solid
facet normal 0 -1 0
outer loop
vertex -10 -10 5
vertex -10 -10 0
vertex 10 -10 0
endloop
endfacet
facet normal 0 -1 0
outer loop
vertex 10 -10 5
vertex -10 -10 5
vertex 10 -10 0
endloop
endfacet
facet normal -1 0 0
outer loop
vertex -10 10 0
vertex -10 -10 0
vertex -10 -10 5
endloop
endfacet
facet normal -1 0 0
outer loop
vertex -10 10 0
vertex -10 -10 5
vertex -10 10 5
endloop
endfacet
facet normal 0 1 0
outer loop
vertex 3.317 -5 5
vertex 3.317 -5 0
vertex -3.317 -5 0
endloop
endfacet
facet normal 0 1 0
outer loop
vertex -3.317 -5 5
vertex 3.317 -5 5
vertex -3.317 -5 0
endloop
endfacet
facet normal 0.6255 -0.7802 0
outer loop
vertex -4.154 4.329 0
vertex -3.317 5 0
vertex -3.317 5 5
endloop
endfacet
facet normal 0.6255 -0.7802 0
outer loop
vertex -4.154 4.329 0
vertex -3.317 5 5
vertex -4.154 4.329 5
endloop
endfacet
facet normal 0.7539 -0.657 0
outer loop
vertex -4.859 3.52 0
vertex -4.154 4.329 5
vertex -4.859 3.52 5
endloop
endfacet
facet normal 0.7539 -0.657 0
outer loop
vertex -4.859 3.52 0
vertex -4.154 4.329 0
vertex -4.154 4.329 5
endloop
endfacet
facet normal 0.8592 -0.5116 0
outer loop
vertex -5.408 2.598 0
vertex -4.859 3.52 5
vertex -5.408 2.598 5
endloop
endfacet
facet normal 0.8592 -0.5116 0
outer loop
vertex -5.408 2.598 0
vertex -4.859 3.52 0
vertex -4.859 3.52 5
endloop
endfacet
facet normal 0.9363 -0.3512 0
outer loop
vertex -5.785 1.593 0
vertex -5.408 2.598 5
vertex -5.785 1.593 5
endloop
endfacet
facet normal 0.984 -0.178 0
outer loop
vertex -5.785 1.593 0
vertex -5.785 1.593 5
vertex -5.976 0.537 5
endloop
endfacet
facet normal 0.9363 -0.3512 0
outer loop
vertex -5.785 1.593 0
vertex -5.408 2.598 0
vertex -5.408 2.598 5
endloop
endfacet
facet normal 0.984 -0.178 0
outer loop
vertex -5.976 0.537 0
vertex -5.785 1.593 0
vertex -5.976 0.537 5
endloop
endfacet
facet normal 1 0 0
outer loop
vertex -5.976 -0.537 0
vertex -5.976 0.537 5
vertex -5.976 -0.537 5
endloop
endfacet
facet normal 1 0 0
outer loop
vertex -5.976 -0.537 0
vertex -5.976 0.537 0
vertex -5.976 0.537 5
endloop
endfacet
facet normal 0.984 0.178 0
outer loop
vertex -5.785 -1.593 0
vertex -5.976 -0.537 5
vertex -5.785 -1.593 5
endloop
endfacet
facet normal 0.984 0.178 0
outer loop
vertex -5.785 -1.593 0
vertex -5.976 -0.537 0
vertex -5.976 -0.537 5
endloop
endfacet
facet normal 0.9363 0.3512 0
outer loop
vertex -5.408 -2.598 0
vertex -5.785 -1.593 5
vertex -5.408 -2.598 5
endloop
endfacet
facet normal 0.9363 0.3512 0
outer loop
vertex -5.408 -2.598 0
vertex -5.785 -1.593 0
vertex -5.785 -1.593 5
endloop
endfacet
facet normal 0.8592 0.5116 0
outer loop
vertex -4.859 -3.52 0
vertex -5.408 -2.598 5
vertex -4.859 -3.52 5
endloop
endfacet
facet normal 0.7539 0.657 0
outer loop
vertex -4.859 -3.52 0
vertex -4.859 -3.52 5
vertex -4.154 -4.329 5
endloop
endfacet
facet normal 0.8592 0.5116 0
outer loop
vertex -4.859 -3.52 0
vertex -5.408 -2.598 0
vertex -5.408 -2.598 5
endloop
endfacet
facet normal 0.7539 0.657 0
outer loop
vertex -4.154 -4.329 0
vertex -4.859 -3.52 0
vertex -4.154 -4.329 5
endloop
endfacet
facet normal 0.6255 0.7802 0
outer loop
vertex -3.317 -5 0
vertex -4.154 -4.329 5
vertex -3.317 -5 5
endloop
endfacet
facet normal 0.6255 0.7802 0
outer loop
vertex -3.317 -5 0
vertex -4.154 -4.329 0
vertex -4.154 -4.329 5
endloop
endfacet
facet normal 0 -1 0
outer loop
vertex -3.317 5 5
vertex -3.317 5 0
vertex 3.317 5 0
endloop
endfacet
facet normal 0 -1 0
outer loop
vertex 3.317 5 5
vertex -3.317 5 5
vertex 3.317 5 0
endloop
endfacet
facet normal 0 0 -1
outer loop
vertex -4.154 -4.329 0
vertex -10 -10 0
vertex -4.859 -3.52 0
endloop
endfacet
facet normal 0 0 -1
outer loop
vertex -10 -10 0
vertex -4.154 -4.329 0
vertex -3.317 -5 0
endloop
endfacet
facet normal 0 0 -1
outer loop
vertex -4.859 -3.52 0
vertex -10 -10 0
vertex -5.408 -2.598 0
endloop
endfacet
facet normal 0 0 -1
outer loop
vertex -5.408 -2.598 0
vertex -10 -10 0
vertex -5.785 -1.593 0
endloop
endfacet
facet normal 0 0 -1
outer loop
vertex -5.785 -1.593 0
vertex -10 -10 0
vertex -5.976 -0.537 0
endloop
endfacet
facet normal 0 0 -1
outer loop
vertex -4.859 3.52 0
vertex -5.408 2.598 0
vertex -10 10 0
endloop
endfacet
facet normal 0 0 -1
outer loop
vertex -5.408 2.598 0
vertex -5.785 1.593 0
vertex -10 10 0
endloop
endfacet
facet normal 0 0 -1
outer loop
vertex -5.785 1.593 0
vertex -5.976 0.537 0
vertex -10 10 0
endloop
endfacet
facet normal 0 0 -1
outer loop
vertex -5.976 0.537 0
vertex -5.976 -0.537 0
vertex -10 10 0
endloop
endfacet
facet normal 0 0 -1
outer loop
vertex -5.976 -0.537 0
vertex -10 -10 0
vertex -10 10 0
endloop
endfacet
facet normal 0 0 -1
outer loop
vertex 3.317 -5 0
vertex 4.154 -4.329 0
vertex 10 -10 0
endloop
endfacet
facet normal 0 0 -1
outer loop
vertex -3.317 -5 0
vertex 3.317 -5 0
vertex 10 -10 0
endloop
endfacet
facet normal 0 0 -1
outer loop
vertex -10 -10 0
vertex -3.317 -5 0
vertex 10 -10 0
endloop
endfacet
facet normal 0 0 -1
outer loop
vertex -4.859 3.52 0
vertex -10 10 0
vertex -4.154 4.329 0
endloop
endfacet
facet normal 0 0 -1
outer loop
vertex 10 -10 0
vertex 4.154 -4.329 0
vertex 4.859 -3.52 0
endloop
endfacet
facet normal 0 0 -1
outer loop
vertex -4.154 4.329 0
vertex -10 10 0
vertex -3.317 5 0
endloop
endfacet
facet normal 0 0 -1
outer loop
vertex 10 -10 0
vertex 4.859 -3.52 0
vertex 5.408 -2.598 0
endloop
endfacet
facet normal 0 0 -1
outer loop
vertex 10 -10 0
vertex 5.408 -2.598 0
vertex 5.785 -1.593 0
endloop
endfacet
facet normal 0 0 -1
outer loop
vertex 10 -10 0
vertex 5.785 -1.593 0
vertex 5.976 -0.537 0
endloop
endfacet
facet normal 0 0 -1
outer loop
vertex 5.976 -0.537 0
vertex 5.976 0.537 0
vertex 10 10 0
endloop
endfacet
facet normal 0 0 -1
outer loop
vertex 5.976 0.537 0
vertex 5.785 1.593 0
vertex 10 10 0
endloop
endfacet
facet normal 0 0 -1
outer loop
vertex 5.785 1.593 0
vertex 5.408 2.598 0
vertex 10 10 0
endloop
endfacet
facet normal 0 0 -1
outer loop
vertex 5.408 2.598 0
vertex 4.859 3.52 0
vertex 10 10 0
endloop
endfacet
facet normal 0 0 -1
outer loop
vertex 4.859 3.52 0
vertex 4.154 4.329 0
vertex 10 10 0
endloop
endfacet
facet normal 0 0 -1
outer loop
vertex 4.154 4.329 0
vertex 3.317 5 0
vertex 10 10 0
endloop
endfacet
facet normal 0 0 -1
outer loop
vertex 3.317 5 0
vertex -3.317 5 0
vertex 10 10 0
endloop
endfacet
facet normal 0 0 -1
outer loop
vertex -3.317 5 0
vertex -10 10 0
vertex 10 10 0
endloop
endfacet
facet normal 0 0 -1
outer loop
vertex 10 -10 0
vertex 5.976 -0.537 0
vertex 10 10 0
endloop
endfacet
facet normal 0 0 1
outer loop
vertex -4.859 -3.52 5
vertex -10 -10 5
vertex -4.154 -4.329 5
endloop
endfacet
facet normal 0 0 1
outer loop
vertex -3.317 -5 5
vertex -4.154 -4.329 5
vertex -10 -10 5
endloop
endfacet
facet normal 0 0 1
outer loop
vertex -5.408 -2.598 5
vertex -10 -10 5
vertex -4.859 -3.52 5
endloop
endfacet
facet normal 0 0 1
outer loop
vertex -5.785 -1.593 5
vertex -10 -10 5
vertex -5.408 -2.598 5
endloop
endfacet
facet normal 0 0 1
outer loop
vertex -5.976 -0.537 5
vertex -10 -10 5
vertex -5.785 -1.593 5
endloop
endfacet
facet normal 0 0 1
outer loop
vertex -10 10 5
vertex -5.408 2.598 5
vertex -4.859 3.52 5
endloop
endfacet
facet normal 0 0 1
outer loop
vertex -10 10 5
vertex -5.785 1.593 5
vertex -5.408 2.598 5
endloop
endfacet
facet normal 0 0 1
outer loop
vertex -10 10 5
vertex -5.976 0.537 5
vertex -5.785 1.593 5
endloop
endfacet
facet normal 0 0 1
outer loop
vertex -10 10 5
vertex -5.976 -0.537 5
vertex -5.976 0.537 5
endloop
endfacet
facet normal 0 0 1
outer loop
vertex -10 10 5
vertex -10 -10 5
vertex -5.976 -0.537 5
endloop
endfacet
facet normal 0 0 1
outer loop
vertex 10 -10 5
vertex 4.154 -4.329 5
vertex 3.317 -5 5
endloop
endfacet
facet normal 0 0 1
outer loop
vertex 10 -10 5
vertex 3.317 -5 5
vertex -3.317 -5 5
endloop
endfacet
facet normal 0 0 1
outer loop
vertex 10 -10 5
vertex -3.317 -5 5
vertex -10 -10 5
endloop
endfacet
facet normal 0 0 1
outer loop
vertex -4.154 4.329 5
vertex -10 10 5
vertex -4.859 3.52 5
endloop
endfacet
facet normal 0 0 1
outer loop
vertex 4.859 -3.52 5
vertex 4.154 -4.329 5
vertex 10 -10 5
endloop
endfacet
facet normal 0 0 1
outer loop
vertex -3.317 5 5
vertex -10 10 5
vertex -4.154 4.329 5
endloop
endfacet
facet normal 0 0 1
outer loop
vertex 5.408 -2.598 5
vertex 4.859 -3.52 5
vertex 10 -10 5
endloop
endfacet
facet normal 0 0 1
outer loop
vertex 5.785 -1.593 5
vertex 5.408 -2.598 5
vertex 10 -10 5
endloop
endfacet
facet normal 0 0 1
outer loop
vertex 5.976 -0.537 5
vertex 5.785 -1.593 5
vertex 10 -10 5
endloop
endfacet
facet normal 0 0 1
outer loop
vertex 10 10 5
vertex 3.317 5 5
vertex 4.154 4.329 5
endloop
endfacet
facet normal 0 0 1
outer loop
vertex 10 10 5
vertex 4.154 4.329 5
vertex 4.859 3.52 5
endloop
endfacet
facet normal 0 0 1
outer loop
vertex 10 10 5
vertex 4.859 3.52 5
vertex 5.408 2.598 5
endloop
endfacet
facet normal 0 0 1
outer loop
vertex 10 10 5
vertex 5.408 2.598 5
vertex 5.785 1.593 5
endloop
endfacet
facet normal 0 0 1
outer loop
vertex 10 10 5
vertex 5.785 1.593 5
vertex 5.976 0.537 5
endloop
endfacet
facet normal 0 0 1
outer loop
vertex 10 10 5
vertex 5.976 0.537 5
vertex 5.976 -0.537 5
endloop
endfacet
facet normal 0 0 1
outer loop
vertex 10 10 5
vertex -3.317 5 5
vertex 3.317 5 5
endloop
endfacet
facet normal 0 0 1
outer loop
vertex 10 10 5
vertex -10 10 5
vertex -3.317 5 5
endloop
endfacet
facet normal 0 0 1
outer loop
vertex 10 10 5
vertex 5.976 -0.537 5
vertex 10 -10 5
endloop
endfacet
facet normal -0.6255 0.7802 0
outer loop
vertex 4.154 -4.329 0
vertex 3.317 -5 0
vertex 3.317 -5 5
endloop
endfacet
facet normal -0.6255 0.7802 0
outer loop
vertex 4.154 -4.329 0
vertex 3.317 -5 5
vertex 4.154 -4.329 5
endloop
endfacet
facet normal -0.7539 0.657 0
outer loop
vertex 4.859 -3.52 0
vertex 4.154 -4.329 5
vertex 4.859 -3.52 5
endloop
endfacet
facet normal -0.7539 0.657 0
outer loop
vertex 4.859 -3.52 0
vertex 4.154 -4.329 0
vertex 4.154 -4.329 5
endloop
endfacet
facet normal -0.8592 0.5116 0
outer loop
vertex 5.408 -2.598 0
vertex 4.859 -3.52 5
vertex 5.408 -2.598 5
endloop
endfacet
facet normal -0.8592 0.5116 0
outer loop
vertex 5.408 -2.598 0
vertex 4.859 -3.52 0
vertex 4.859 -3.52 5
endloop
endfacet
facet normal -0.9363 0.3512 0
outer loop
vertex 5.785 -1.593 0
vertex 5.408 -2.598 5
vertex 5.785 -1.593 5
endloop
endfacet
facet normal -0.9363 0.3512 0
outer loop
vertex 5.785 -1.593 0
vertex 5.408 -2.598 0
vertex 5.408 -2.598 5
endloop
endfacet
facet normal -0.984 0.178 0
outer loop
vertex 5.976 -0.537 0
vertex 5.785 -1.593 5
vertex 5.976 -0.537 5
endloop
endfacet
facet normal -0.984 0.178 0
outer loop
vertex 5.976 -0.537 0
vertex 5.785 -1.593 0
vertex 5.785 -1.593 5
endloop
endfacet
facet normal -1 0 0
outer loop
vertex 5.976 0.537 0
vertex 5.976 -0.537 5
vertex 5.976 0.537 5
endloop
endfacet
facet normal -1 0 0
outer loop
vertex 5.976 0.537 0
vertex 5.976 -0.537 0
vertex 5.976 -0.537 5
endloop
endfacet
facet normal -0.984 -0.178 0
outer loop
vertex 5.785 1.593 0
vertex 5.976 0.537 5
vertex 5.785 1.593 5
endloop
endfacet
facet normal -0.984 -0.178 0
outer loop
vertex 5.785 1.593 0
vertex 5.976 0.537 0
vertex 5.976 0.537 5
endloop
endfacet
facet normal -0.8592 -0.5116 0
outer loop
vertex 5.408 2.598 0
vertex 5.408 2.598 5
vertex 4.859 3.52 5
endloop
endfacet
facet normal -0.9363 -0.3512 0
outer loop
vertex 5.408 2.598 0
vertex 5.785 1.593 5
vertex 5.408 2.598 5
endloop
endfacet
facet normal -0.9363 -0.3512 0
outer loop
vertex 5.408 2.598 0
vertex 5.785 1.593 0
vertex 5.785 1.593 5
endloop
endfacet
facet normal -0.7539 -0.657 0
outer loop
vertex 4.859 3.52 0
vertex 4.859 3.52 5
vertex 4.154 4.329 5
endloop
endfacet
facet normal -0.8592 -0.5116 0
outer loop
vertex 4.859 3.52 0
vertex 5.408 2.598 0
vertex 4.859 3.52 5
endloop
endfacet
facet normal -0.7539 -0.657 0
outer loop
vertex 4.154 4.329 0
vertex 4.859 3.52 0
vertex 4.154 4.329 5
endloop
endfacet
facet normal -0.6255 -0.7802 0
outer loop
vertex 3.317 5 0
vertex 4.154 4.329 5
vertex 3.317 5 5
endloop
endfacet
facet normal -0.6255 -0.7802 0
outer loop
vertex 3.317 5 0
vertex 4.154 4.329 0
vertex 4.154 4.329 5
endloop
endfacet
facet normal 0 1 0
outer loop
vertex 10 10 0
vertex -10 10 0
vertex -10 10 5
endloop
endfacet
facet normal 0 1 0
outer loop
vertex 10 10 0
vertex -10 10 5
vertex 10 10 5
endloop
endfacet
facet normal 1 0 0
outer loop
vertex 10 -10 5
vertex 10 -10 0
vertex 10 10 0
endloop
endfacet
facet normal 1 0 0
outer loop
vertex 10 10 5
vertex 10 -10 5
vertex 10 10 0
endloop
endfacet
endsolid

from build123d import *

# Parameters (mm, degrees)
SKETCH1_W           = 20
SKETCH1_H           = 20
SKETCH1_R           = 6
BOSS_EXTRUDE1_DEPTH = 5


with BuildPart() as part:
    # Sketch1 → Boss-Extrude1 (new body)
    # profile 1 of 3: a face of its own
    with BuildSketch(Plane.XY):
        Rectangle(SKETCH1_W, SKETCH1_H)
        Circle(SKETCH1_R, mode=Mode.SUBTRACT)
    # profile 2 of 3: a face of its own
    with BuildSketch(Plane.XY):
        with BuildLine():
            ThreePointArc((3.31662479, 5), (0, 6), (-3.31662479, 5))
            Line((-3.31662479, 5), (3.31662479, 5))
        make_face()
    # profile 3 of 3: a face of its own
    with BuildSketch(Plane.XY):
        with BuildLine():
            Line((3.31662479, -5), (-3.31662479, -5))
            ThreePointArc((-3.31662479, -5), (0, -6), (3.31662479, -5))
        make_face()
    extrude(amount=BOSS_EXTRUDE1_DEPTH)


solid = part.part
